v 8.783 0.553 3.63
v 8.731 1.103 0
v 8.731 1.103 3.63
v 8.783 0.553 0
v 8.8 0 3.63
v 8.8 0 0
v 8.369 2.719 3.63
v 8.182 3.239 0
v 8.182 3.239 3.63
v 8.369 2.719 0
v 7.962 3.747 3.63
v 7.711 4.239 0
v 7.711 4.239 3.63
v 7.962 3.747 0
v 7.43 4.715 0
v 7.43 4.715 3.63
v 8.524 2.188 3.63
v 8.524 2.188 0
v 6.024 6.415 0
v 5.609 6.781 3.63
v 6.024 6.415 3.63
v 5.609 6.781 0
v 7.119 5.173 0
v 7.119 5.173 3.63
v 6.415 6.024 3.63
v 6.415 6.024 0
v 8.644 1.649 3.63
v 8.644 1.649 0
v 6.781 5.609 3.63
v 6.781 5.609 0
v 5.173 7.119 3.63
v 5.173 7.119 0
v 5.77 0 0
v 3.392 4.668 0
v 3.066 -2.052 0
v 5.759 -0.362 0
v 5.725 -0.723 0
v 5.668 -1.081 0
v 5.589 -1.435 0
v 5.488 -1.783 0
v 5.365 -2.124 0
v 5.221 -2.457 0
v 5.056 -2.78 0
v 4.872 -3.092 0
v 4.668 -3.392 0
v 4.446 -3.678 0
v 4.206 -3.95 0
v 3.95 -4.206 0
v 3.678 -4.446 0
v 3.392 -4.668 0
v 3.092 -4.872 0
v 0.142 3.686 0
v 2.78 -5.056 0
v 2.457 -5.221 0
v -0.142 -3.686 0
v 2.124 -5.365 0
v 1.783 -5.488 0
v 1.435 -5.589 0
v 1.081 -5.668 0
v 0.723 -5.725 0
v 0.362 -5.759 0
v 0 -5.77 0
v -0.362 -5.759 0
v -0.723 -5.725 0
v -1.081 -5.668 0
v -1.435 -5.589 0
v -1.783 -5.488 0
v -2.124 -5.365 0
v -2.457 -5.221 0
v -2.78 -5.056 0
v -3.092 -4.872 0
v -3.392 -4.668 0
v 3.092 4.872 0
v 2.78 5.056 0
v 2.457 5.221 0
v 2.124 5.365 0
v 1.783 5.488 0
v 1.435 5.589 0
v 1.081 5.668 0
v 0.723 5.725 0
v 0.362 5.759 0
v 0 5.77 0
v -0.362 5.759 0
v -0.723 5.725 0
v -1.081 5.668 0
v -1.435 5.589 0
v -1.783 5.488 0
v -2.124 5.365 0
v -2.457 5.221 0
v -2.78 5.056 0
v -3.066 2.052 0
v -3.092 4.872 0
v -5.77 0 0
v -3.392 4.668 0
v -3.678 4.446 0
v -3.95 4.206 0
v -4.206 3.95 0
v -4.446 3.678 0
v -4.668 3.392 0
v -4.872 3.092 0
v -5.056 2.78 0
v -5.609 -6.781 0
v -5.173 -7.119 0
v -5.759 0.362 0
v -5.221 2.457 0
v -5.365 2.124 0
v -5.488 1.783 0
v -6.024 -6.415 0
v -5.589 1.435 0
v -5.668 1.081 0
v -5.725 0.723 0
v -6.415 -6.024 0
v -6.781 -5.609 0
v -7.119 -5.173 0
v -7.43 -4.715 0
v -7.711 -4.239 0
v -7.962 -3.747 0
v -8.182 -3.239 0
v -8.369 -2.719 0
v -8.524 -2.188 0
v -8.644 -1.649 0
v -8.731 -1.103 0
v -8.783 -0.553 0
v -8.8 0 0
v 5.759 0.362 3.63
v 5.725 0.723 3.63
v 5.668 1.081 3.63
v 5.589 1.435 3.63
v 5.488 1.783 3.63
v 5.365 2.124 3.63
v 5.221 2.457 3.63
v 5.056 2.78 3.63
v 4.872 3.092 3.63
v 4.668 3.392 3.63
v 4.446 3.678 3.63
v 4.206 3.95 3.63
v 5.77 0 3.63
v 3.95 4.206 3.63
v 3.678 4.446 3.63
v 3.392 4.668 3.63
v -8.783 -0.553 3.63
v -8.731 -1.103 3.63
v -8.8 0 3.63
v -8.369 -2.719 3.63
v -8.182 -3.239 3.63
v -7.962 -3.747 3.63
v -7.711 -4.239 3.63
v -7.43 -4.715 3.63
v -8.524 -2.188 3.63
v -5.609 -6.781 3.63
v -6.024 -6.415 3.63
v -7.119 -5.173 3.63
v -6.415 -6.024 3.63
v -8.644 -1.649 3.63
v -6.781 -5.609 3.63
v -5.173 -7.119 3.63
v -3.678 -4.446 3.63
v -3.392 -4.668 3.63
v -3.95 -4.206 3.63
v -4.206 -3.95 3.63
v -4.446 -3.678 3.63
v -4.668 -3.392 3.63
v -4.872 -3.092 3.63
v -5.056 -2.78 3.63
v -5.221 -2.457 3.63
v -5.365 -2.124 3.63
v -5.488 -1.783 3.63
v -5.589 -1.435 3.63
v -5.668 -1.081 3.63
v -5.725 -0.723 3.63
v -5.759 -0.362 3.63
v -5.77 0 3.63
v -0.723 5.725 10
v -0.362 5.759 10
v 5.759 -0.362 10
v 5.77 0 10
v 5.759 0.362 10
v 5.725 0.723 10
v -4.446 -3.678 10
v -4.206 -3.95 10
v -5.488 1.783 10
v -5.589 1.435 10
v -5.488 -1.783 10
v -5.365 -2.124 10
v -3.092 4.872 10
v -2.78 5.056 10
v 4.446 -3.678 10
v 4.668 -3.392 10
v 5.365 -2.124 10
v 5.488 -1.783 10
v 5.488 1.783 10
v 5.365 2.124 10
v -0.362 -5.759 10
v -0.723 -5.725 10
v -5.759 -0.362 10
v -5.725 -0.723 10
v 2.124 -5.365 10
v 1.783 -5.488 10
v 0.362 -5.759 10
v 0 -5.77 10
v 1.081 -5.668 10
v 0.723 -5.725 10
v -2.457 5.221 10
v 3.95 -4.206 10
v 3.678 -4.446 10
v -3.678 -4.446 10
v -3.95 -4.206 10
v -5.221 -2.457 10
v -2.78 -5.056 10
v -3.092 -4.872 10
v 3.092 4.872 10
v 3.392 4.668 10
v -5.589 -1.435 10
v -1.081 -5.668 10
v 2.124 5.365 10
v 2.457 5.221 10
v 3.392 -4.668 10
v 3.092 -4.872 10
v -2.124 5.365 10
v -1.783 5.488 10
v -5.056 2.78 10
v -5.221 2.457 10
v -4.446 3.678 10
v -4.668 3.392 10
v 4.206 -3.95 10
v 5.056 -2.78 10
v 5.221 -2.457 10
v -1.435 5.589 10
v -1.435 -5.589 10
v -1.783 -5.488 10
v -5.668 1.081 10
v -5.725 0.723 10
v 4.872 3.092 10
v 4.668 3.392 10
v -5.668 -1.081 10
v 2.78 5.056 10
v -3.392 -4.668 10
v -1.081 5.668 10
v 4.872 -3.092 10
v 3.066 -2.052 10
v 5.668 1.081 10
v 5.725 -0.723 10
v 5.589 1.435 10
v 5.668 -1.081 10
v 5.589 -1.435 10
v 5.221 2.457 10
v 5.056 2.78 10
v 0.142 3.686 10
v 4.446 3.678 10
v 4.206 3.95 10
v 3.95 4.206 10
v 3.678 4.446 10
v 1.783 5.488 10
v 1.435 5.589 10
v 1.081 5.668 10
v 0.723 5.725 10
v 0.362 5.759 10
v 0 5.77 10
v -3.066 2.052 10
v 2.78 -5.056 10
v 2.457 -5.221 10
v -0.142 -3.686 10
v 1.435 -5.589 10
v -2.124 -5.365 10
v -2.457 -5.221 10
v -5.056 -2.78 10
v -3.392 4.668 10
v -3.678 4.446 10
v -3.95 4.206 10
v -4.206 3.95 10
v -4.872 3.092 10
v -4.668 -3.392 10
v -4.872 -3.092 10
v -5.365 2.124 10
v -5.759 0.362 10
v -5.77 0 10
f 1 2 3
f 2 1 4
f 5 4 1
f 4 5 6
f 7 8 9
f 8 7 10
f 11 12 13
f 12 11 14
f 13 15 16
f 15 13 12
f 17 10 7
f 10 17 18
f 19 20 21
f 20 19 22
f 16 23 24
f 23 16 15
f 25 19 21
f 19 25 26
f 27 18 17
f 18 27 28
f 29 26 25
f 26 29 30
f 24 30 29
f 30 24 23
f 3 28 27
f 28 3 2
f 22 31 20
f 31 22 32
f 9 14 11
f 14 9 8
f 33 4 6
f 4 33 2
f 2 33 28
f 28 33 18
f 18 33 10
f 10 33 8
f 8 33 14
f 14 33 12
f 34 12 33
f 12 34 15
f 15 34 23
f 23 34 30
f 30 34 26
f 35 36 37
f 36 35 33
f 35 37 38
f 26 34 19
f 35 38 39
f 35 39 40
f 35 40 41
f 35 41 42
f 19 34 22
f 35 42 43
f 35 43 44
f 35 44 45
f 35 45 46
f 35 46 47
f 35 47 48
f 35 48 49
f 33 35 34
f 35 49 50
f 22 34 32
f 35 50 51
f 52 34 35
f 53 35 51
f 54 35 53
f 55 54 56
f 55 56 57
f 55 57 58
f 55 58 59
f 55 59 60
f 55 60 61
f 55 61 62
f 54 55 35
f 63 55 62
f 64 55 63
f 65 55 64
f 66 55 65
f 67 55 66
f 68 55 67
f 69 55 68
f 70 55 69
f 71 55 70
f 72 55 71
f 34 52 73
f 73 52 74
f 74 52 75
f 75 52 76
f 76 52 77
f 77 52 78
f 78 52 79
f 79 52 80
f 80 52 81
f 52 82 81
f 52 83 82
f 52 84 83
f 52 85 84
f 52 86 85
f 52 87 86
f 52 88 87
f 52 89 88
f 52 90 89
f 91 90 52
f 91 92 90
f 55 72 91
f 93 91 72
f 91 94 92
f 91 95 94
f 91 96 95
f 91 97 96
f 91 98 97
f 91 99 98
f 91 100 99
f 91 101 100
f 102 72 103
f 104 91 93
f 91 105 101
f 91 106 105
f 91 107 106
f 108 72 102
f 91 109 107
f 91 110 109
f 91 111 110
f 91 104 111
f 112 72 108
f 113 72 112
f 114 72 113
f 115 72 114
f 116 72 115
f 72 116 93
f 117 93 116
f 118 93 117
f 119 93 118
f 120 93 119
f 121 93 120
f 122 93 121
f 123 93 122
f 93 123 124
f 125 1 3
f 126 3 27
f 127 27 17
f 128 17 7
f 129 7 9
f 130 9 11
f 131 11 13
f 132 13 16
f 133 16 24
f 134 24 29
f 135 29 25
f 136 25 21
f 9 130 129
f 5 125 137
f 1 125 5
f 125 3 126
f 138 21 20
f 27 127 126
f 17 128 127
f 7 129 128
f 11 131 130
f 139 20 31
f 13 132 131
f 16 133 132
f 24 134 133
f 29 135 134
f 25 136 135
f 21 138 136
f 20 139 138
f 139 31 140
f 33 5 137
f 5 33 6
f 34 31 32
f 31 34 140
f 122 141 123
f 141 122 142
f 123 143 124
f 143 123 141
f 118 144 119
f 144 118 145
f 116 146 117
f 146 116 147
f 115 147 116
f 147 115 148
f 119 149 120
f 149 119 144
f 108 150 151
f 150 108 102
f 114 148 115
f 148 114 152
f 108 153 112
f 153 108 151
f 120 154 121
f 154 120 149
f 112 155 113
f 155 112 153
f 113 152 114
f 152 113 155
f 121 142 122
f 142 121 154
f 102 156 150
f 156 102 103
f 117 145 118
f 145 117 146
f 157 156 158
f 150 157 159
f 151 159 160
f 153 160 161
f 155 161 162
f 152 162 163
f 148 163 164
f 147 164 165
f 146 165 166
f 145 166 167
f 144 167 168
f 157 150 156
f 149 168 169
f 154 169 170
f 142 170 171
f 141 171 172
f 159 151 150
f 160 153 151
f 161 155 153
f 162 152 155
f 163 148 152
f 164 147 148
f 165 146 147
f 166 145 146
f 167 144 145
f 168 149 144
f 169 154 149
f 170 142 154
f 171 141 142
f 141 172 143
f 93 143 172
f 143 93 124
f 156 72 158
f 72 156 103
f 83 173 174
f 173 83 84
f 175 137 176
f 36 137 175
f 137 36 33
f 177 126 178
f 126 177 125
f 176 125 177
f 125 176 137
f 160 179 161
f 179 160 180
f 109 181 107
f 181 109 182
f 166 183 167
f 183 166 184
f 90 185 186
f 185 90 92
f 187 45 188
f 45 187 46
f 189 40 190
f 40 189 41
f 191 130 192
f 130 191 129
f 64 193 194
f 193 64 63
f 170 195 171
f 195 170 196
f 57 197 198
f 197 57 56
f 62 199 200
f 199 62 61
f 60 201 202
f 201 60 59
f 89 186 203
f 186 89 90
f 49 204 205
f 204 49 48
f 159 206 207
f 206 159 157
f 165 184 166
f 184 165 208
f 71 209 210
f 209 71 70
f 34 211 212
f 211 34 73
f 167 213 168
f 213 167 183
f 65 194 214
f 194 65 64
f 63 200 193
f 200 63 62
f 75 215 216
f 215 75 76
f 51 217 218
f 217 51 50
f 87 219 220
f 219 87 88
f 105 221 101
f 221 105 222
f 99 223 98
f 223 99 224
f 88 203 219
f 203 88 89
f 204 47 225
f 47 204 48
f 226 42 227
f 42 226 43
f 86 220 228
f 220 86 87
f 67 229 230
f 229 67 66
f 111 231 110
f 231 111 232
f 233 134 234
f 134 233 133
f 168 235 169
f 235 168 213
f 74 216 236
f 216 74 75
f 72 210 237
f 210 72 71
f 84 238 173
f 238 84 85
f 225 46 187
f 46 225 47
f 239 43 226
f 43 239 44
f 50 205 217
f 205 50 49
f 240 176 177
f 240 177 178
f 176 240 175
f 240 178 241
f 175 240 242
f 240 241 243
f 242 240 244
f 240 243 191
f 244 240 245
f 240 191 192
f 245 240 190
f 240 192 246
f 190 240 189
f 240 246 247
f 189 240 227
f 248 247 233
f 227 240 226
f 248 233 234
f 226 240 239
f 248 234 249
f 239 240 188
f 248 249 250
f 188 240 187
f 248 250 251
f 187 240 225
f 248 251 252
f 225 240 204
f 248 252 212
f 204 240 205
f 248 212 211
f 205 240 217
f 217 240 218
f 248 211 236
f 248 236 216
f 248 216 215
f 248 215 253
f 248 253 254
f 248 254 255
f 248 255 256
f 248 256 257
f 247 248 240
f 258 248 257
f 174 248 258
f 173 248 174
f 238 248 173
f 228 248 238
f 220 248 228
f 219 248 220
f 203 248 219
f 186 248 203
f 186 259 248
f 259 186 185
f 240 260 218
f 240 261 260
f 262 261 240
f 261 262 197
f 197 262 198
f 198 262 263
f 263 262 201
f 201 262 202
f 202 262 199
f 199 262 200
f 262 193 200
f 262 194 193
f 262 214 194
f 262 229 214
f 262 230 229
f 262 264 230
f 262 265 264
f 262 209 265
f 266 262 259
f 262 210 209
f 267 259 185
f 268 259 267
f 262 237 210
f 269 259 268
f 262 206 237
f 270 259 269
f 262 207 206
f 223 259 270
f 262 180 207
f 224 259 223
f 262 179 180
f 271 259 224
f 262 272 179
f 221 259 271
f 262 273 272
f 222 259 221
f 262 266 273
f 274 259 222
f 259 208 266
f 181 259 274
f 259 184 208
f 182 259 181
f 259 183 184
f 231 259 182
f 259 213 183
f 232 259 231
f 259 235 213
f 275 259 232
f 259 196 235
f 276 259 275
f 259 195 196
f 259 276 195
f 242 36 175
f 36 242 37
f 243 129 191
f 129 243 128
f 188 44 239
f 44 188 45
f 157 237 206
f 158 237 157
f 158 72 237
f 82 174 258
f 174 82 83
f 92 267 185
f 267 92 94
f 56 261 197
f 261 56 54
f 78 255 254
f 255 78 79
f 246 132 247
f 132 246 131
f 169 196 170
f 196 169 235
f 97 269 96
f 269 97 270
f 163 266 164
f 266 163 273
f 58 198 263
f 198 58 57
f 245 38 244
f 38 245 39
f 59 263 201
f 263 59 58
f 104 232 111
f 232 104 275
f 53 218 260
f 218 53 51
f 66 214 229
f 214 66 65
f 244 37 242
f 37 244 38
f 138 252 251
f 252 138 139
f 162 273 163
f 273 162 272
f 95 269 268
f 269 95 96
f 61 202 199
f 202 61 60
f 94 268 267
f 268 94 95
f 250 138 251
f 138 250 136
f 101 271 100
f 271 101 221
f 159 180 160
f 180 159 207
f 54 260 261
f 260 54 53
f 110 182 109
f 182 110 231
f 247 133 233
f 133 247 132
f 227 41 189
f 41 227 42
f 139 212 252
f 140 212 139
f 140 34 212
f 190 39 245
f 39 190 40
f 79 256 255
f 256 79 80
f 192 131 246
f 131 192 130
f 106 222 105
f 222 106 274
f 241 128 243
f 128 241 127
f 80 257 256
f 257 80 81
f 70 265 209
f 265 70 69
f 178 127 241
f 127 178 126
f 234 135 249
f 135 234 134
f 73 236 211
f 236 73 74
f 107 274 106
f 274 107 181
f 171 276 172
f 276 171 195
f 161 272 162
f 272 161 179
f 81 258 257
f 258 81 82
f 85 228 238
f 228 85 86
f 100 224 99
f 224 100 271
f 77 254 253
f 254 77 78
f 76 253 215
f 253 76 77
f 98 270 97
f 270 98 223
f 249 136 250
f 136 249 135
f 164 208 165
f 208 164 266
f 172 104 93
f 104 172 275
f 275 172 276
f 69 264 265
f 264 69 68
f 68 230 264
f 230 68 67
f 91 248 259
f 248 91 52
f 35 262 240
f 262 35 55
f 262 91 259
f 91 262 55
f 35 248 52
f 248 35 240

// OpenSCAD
$fa = .1;
$fn = 100;

//Heigth of the main cylinder
Heigth = 10.0;
//Radius of the main cylinder
RadiusCylinder = 11.54/2;
//Radius of the Pie part
RadiusPie = 17.6/2;
//heigth of the Pie part
HeigthPie = 3.63;
//Width if the Pie piece in degrees
PiePieceWidth = 54;
//Width of the hole in the main cylinder
widthHole = 3.6;
//Length of the hole in the main cylinder
lengthHole = 6.44; 

module pie_slice(r, a, h, q=90){
  intersection(){
    cylinder(h=h, r=r);
    cube([r, r, h]);
    rotate(a-q) cube([r, r, h]);
  }
}

module ding(){
	cylinder(h = Heigth, r = RadiusCylinder);
	pie_slice(r=RadiusPie,a=PiePieceWidth,h=HeigthPie);
	rotate(180) pie_slice(r=RadiusPie,a=PiePieceWidth,h=HeigthPie);
}

difference(){
	ding();
	rotate(90 + PiePieceWidth/2) cube([lengthHole, widthHole, Heigth*2+0.1], center=true);
}
